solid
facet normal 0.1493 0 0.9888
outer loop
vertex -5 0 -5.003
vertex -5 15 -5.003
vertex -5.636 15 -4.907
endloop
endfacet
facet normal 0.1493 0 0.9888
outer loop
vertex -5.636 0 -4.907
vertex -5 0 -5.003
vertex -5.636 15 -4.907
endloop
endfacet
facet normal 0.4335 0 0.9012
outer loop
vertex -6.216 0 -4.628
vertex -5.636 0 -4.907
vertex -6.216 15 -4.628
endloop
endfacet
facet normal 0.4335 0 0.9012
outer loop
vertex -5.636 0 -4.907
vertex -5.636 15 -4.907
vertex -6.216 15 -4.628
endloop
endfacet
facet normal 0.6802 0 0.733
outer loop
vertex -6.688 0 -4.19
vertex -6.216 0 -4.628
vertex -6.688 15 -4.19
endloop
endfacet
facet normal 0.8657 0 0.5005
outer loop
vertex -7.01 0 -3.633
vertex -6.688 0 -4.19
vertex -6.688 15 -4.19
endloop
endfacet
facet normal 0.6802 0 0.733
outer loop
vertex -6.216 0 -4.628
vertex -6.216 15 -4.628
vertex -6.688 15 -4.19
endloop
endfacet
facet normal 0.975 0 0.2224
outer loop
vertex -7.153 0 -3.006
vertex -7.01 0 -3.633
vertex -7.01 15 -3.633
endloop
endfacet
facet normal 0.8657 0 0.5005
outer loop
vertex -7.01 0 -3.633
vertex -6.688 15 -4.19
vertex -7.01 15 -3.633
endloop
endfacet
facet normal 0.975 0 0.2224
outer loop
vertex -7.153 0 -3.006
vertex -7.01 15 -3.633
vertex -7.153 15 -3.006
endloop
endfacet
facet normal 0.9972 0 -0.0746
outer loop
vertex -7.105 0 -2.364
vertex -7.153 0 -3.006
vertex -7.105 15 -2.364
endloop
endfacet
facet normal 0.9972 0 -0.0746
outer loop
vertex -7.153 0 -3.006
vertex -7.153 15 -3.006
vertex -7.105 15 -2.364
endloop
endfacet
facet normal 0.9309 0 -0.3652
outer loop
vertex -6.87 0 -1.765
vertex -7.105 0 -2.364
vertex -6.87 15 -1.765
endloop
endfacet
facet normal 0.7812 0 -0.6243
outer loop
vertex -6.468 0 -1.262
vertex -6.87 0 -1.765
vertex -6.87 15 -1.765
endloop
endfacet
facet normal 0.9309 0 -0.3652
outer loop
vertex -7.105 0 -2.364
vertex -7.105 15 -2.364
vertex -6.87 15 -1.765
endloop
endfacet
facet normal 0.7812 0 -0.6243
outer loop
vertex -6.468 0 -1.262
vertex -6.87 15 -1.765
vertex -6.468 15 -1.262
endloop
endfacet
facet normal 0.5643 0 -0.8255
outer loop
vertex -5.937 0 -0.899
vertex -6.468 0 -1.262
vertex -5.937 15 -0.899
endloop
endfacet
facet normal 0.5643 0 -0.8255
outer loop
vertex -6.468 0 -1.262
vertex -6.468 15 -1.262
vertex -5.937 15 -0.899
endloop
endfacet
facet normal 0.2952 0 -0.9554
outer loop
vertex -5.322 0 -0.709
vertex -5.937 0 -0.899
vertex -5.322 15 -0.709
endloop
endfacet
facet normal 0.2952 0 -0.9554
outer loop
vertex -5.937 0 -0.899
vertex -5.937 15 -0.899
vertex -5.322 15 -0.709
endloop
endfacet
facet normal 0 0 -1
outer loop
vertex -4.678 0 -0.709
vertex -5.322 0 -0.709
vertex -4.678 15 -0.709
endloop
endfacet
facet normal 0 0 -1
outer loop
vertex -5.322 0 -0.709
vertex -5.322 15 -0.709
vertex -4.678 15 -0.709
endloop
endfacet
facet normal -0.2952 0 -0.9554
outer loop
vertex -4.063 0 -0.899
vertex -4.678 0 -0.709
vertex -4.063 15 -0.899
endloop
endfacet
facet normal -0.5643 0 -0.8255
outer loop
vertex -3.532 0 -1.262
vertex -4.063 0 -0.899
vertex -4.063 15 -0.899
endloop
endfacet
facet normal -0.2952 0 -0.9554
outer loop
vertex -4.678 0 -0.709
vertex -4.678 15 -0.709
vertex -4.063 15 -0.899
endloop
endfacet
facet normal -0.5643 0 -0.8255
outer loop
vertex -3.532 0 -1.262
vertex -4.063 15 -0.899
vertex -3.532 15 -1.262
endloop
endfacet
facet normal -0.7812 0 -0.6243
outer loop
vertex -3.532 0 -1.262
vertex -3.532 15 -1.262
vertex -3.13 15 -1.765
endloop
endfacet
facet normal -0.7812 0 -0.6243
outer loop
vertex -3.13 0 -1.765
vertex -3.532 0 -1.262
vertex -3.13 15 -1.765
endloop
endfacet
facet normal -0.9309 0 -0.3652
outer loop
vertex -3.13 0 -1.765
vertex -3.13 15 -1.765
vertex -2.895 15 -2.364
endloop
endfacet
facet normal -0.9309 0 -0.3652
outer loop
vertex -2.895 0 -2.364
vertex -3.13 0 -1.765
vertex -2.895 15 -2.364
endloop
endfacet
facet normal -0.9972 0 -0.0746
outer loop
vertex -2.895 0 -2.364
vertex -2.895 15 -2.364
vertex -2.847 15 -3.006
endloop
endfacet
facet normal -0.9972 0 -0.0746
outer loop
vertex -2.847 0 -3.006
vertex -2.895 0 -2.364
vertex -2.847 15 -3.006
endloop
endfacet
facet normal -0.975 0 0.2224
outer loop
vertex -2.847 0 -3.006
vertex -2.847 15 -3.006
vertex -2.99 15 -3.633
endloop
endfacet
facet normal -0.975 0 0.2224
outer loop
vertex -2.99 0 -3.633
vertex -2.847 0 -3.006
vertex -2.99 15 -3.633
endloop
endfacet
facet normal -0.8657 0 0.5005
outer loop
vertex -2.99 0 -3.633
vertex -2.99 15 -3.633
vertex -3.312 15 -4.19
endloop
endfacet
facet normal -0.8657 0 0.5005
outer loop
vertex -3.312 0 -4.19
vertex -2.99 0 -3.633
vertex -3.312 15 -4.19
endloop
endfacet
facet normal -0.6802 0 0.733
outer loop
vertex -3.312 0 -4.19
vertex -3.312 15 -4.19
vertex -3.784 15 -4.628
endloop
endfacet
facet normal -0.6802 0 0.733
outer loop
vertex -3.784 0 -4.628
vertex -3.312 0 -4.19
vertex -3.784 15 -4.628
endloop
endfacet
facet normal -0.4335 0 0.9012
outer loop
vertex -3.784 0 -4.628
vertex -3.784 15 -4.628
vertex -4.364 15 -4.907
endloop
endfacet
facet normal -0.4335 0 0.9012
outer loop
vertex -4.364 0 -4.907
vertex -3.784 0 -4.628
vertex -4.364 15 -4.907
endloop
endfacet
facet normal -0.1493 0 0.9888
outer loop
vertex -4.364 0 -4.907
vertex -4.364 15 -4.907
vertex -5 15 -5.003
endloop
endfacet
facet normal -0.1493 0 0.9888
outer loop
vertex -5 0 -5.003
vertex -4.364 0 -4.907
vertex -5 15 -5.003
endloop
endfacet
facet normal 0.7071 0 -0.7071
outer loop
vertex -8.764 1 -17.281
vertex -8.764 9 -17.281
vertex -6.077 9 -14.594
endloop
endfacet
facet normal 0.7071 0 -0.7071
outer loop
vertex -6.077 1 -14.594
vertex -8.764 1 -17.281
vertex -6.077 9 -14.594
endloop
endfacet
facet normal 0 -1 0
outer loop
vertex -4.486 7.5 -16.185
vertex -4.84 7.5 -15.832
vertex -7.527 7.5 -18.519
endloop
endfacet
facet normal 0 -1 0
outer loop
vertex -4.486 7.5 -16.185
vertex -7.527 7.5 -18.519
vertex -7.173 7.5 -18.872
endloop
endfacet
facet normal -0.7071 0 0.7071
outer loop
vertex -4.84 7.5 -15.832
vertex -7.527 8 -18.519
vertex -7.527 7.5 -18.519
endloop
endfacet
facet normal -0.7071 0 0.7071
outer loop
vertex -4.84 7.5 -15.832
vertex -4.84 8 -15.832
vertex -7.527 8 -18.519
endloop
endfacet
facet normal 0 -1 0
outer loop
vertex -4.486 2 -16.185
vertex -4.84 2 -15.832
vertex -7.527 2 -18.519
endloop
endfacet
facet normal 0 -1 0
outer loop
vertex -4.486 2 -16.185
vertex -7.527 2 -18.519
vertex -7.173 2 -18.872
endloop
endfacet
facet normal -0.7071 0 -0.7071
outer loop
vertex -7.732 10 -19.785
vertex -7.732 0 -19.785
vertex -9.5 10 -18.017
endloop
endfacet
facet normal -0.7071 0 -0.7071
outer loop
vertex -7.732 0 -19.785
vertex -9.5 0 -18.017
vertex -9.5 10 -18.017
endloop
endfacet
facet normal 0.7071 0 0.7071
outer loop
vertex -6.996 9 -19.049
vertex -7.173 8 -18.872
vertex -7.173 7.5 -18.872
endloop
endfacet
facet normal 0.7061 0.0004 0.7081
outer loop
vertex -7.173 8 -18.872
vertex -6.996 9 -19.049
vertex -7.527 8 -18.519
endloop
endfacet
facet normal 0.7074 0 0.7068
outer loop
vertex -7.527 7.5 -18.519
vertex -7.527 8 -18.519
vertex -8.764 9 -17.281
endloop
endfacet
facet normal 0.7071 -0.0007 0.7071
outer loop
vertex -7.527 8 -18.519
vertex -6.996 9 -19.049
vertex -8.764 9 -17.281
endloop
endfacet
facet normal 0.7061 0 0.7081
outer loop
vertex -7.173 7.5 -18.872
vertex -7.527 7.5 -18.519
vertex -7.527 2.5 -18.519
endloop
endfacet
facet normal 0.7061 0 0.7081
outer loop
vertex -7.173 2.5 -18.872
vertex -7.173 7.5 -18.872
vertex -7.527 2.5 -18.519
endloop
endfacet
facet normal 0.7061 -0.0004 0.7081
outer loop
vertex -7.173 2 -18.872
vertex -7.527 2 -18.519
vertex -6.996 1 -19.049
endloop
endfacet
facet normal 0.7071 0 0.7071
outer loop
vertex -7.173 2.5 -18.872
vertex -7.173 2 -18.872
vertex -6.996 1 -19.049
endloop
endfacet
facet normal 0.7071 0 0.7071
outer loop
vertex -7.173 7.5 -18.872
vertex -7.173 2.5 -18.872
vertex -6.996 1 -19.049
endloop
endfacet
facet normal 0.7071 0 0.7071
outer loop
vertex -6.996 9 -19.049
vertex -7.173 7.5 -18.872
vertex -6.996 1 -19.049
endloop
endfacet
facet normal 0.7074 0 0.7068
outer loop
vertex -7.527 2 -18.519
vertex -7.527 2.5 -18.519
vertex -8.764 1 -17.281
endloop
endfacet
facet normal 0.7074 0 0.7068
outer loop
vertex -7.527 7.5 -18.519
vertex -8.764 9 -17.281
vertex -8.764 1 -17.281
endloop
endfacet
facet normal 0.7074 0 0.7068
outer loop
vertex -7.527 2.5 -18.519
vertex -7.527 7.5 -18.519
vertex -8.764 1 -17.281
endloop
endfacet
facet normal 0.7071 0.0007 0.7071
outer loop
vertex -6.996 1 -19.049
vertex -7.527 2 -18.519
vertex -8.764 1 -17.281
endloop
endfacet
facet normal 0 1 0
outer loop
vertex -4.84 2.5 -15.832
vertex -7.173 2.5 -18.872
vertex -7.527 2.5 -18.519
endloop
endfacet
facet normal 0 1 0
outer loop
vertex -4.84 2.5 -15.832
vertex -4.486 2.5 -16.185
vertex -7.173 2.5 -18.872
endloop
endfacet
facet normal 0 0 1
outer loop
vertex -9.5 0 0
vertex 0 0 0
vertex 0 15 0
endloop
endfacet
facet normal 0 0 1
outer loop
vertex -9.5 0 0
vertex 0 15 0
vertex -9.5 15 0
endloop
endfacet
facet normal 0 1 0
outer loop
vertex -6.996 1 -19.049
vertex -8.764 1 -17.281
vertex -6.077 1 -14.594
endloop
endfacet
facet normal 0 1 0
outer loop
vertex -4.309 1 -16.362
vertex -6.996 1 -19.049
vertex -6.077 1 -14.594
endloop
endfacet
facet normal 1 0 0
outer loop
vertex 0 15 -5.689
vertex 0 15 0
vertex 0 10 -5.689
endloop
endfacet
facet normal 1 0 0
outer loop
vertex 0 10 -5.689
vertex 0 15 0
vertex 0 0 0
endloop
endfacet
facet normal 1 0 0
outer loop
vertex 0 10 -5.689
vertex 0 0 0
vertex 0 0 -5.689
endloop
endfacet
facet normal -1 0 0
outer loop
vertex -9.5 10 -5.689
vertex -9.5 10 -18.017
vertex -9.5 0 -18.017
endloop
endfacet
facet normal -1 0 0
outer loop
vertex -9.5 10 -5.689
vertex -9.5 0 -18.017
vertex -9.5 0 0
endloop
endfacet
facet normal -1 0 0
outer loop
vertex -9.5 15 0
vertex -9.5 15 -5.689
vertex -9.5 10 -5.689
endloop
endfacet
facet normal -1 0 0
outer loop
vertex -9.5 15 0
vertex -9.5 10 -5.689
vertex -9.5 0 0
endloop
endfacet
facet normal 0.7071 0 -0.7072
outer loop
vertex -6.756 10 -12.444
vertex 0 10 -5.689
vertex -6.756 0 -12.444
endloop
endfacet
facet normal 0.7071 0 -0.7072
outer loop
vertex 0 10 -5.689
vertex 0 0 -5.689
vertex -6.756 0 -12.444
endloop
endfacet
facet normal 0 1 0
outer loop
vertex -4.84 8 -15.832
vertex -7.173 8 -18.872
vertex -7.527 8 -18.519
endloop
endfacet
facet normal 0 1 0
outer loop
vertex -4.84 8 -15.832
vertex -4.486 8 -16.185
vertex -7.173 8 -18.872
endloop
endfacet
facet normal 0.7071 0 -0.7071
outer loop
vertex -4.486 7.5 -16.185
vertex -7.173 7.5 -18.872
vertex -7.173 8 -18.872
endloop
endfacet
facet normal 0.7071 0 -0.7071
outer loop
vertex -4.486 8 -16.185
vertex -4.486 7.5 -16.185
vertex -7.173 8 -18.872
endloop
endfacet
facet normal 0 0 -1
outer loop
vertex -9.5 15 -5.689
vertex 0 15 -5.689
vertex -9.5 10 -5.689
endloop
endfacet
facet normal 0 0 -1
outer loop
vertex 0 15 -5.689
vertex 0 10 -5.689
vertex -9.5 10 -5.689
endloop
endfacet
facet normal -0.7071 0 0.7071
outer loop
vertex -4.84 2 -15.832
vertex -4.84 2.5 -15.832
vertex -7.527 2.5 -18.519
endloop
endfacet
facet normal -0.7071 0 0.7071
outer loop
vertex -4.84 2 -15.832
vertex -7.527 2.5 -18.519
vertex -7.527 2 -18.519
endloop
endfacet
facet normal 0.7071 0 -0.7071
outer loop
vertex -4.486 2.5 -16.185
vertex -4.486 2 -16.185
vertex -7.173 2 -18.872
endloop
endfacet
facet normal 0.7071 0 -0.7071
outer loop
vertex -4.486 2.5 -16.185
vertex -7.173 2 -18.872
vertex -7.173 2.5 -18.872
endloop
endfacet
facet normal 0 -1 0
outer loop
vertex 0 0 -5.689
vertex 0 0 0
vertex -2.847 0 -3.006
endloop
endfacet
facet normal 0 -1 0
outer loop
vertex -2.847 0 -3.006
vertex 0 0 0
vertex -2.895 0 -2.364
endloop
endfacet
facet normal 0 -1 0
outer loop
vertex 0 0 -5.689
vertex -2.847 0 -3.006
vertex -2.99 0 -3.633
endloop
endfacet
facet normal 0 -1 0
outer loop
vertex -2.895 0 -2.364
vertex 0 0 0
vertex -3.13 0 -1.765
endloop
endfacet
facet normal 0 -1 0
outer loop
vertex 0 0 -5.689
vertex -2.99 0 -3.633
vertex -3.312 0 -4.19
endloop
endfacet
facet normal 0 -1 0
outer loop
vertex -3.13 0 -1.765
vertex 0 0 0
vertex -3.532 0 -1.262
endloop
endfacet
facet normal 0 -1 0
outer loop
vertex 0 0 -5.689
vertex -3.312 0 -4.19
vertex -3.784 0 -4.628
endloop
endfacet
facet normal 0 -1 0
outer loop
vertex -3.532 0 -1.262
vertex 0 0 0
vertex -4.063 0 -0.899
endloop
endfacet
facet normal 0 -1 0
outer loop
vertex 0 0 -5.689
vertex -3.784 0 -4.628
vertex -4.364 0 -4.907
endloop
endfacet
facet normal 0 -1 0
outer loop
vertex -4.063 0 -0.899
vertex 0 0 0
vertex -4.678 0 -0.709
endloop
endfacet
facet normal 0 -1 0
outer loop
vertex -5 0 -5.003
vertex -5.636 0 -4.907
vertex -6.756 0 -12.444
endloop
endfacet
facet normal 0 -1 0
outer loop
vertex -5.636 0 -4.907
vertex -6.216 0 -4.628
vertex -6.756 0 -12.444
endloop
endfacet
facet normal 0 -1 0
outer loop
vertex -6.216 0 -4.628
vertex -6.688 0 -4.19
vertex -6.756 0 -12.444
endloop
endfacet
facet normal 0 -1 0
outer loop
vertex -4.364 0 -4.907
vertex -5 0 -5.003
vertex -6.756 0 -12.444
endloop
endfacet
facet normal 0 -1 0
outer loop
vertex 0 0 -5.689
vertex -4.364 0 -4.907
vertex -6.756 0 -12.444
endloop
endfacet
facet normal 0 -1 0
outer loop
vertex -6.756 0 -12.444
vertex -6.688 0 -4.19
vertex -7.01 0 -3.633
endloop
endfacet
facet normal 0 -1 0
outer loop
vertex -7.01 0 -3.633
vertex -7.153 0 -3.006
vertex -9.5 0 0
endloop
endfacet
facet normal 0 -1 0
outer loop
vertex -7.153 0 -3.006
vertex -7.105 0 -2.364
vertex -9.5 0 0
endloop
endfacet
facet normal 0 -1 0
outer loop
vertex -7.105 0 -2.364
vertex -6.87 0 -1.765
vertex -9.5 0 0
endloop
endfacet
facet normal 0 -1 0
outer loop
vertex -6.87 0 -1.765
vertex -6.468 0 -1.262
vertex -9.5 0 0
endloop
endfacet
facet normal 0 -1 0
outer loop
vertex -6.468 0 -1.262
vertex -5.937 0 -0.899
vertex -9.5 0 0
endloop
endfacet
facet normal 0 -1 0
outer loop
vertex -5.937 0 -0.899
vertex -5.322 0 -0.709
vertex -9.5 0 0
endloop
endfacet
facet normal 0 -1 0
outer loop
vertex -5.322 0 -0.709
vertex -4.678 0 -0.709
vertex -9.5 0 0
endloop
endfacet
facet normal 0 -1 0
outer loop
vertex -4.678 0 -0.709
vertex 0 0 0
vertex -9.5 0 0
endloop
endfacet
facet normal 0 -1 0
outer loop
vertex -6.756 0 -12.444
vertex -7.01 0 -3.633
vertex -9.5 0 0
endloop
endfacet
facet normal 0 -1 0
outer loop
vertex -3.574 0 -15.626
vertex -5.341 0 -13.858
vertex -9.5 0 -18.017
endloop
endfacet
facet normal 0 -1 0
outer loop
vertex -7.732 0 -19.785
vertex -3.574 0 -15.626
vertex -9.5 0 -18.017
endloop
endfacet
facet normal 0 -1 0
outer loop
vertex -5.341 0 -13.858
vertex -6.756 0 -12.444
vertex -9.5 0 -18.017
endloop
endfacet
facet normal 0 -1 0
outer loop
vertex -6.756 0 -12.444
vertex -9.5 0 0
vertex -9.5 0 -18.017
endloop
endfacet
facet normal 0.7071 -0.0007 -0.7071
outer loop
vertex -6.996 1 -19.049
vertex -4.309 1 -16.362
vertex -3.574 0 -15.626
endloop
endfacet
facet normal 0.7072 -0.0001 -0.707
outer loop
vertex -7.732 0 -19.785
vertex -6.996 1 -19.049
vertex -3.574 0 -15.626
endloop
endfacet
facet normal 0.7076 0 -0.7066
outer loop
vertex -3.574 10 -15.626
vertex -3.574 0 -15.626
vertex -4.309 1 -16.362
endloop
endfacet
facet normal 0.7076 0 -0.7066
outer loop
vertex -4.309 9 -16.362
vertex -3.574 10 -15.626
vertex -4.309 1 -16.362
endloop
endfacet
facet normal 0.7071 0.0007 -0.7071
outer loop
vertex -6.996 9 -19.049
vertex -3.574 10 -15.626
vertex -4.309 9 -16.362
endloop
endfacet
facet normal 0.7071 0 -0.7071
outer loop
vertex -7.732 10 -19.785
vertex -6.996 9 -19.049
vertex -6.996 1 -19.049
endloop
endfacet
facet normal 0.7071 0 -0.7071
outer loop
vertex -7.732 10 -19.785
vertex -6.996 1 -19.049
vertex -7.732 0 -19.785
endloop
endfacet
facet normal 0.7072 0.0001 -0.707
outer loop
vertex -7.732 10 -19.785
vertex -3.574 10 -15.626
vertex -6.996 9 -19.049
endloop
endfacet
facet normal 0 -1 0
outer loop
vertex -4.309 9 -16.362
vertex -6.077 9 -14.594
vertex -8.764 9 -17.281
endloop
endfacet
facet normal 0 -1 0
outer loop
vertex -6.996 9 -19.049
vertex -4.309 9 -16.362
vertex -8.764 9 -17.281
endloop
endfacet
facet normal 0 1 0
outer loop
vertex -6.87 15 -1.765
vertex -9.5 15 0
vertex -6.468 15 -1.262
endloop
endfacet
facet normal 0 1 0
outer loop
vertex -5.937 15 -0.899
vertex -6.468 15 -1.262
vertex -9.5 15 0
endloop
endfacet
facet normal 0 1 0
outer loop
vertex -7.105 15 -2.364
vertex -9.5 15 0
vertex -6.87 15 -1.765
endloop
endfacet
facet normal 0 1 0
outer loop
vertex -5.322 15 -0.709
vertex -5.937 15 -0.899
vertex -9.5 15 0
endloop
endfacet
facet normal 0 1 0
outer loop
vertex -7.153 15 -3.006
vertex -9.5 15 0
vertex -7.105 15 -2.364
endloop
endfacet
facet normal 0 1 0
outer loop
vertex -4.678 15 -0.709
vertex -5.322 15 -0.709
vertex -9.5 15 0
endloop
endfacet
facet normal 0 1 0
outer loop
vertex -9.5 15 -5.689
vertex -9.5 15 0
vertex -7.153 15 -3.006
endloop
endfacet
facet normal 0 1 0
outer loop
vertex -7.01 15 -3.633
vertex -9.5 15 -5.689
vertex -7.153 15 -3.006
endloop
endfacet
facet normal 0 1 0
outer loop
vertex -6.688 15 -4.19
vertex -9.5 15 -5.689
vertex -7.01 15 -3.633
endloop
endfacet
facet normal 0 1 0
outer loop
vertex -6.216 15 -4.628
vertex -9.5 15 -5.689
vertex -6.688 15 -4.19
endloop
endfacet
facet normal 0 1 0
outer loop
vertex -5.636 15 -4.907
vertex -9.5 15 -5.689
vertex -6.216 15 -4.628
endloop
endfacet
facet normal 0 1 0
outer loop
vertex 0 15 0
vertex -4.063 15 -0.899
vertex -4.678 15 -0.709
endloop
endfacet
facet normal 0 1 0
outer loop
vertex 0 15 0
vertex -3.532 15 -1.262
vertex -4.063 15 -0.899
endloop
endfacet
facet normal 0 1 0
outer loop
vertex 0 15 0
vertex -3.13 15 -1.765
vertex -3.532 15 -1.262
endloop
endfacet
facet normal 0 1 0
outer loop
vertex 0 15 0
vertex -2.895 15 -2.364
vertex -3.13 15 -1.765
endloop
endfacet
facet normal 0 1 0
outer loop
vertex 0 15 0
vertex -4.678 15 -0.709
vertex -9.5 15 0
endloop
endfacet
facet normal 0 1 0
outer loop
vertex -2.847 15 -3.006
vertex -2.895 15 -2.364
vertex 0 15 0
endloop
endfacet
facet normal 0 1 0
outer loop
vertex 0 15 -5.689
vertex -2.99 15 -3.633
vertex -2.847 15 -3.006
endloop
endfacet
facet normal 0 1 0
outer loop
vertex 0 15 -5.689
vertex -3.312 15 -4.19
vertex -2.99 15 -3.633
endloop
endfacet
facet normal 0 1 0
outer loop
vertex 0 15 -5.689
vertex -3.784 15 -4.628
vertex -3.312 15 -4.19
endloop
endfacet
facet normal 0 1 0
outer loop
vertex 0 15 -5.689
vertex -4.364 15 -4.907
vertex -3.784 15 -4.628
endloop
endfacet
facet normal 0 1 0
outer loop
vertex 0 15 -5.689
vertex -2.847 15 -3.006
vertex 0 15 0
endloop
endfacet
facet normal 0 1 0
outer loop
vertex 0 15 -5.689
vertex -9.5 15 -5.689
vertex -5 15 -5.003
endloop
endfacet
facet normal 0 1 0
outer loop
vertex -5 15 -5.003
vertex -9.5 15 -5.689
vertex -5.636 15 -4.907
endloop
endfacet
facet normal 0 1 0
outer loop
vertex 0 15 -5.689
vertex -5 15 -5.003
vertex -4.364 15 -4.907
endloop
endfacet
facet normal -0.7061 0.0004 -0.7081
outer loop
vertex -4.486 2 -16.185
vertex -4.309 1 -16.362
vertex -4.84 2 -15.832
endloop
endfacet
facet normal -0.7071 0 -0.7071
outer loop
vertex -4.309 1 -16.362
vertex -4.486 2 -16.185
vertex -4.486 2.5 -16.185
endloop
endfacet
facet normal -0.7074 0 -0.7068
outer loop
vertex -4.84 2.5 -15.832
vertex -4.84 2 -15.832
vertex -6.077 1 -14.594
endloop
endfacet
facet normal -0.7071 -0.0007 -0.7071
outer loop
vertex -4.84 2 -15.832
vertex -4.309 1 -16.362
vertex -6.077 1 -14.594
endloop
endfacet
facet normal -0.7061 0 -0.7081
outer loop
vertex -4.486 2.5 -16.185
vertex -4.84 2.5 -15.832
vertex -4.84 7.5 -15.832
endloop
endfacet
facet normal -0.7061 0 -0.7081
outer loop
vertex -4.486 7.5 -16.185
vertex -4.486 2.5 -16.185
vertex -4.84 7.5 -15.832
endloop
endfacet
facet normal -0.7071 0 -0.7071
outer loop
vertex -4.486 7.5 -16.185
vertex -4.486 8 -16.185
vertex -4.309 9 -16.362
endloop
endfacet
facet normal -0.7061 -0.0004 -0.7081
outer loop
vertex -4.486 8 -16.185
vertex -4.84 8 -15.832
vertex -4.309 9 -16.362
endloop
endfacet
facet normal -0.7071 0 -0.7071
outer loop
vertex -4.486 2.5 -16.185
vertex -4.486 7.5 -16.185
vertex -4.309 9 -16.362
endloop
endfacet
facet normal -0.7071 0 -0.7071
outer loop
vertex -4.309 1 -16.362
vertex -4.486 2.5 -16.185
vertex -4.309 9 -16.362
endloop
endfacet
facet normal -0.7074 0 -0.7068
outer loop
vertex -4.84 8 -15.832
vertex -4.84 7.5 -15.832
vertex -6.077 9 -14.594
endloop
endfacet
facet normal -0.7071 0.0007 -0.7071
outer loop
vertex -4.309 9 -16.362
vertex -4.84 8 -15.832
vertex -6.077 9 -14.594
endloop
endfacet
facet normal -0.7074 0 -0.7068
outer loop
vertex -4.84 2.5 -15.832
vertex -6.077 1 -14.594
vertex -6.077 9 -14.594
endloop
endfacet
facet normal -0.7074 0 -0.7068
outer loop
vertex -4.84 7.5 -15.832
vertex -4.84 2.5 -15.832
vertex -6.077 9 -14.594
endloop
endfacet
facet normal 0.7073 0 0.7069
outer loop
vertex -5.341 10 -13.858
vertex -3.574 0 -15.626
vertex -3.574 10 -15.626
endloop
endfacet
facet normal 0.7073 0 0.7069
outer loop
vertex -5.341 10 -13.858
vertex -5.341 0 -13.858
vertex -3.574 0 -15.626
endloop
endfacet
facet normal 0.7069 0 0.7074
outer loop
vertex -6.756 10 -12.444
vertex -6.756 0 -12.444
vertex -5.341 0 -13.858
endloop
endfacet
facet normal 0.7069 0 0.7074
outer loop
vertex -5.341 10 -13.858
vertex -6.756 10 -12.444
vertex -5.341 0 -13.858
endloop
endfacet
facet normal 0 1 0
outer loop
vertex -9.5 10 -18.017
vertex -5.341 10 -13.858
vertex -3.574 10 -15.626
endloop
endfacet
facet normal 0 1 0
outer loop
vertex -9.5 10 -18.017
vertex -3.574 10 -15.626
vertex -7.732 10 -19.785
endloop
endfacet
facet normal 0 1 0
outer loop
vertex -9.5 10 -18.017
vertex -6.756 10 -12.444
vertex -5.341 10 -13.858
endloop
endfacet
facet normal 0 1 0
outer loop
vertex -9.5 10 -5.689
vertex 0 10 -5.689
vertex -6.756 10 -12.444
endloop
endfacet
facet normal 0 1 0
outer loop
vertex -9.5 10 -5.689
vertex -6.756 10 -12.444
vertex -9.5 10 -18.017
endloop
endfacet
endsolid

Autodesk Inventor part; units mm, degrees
ref_plane "YZ Plane" through (0, 0, 0) normal (1, 0, 0) x (0, 1, 0)
ref_plane "XZ Plane" through (0, 0, 0) normal (0, 1, 0) x (-1, 0, 0)
ref_plane "XY Plane" through (0, 0, 0) normal (0, 0, 1) x (1, 0, 0)
sketch "Sketch1" plane through (0, 0, 0) normal (0, 1, 0) x (-1, 0, 0)
  line L0 (0, -5.6886) -> (6.7556, -12.4442)
  line L1 (6.7556, -12.4442) -> (5.3414, -13.8584)
  line L2 (9.5, -18.017) -> (5.3414, -13.8584)
  line L3 (10, -18.017) -> (9.5, -18.017)
  line L4 (10, -18.017) -> (10, 0)
  line L5 (0, 0) -> (10, 0)
  line L6 (0, 0) -> (0, -5.6886)
  circle A0 centre (5, -2.8443) radius 1.339
extrude "Extrusion1" add sketch "Sketch1" along normal blind 10
sketch "Sketch2" plane through (0, 10, 0) normal (0, 1, 0) x (1, 0, 0)
  line L0 (0, 5.6886) -> (-10, 5.6886)
  line L1 (-10, 5.6886) -> (-10, 0)
  line L2 (-10, 0) -> (0, 0)
  line L3 (0, 0) -> (0, 5.6886)
extrude "Extrusion2" add sketch "Sketch2" along normal blind 20
sketch "Sketch3" plane through (0, 0, 0) normal (0, -1, 0) x (1, 0, 0)
  circle A0 centre (-5, -2.8443) radius 1.339 projected
hole "Hole1" at (-5, 0, -2.8443) direction (0, 1, 0) diameter 4.318 end through all
sketch "Sketch8" plane through (-9.5, 0, -18.017) normal (0.7071068, 0, -0.7071068) x (-0.7071068, 0, -0.7071068)
  line L0 (-5.8811, 0) -> (0, 0) projected
  line L1 (0, 0) -> (0, 10) projected
  line L2 (-5.8811, 10) -> (0, 10) projected
  line L3 (-5.8811, 0) -> (-5.8811, 10) projected
  line L4 (-1.0406, 1) -> (-4.8406, 1)
  line L5 (-4.8406, 1) -> (-4.8406, 9)
  line L6 (-4.8406, 9) -> (-1.0406, 9)
  line L7 (-1.0406, 9) -> (-1.0406, 1)
  line L8 (-1.0406, 1) -> (-4.8406, 9) construction
  line L9 (-4.8406, 1) -> (-1.0406, 9) construction
  point P0 (-19.4575, 0)
  point P1 (-2.9406, 5)
  dimension "d41" = 3.8
  dimension "d42" = 8
extrude "Extrusion6" add sketch "Sketch8" along normal blind 2.5
sketch "Sketch9" plane through (-6.0772, 1, -14.5942) normal (-0.7071068, 0, -0.7071068) x (-0.7071068, 0, 0.7071068)
  line L0 (-2.25, 7) -> (-1.75, 7)
  line L1 (-1.75, 7) -> (-1.75, 6.5)
  line L2 (-1.75, 6.5) -> (-2.25, 6.5)
  line L3 (-2.25, 6.5) -> (-2.25, 7)
  line L4 (-1.75, 1) -> (-2.25, 1)
  line L5 (-2.25, 1) -> (-2.25, 1.5)
  line L6 (-2.25, 1.5) -> (-1.75, 1.5)
  line L7 (-1.75, 1.5) -> (-1.75, 1)
  point P0 (6.0224, -1)
  dimension "d45" = 0.5
  dimension "d46" = 0.5
  dimension "d47" = 0.5
  dimension "d48" = 0.5
extrude "Extrusion7" add sketch "Sketch9" along normal blind 4
sketch "Sketch10" plane through (0, 30, 0) normal (0, 1, 0) x (1, 0, 0)
  circle A0 centre (-5, 2.8443) radius 2.159 projected
  line L0 (0, 5.6886) -> (-10, 5.6886) projected
  line L1 (-10, 5.6886) -> (-10, 0) projected
  line L2 (-10, 0) -> (0, 0) projected
  line L3 (0, 0) -> (0, 5.6886) projected
extrude "Extrusion8" cut sketch "Sketch10" against normal blind 15
sketch "Sketch11" plane through (-10, 0, -18.017) normal (-1, 0, 0) x (0, 0, 1)
  line L0 (18.017, 15) -> (12.3284, 15) projected
  line L1 (12.3284, 10) -> (12.3284, 15) projected
  line L2 (0, 10) -> (12.3284, 10) projected
  line L3 (0, 0) -> (0, 10) projected
  line L4 (0, 0) -> (18.017, 0) projected
  line L5 (18.017, 0) -> (18.017, 15) projected
extrude "Extrusion9" cut sketch "Sketch11" against normal blind 0.5
properties part number "TensionMountV2"
